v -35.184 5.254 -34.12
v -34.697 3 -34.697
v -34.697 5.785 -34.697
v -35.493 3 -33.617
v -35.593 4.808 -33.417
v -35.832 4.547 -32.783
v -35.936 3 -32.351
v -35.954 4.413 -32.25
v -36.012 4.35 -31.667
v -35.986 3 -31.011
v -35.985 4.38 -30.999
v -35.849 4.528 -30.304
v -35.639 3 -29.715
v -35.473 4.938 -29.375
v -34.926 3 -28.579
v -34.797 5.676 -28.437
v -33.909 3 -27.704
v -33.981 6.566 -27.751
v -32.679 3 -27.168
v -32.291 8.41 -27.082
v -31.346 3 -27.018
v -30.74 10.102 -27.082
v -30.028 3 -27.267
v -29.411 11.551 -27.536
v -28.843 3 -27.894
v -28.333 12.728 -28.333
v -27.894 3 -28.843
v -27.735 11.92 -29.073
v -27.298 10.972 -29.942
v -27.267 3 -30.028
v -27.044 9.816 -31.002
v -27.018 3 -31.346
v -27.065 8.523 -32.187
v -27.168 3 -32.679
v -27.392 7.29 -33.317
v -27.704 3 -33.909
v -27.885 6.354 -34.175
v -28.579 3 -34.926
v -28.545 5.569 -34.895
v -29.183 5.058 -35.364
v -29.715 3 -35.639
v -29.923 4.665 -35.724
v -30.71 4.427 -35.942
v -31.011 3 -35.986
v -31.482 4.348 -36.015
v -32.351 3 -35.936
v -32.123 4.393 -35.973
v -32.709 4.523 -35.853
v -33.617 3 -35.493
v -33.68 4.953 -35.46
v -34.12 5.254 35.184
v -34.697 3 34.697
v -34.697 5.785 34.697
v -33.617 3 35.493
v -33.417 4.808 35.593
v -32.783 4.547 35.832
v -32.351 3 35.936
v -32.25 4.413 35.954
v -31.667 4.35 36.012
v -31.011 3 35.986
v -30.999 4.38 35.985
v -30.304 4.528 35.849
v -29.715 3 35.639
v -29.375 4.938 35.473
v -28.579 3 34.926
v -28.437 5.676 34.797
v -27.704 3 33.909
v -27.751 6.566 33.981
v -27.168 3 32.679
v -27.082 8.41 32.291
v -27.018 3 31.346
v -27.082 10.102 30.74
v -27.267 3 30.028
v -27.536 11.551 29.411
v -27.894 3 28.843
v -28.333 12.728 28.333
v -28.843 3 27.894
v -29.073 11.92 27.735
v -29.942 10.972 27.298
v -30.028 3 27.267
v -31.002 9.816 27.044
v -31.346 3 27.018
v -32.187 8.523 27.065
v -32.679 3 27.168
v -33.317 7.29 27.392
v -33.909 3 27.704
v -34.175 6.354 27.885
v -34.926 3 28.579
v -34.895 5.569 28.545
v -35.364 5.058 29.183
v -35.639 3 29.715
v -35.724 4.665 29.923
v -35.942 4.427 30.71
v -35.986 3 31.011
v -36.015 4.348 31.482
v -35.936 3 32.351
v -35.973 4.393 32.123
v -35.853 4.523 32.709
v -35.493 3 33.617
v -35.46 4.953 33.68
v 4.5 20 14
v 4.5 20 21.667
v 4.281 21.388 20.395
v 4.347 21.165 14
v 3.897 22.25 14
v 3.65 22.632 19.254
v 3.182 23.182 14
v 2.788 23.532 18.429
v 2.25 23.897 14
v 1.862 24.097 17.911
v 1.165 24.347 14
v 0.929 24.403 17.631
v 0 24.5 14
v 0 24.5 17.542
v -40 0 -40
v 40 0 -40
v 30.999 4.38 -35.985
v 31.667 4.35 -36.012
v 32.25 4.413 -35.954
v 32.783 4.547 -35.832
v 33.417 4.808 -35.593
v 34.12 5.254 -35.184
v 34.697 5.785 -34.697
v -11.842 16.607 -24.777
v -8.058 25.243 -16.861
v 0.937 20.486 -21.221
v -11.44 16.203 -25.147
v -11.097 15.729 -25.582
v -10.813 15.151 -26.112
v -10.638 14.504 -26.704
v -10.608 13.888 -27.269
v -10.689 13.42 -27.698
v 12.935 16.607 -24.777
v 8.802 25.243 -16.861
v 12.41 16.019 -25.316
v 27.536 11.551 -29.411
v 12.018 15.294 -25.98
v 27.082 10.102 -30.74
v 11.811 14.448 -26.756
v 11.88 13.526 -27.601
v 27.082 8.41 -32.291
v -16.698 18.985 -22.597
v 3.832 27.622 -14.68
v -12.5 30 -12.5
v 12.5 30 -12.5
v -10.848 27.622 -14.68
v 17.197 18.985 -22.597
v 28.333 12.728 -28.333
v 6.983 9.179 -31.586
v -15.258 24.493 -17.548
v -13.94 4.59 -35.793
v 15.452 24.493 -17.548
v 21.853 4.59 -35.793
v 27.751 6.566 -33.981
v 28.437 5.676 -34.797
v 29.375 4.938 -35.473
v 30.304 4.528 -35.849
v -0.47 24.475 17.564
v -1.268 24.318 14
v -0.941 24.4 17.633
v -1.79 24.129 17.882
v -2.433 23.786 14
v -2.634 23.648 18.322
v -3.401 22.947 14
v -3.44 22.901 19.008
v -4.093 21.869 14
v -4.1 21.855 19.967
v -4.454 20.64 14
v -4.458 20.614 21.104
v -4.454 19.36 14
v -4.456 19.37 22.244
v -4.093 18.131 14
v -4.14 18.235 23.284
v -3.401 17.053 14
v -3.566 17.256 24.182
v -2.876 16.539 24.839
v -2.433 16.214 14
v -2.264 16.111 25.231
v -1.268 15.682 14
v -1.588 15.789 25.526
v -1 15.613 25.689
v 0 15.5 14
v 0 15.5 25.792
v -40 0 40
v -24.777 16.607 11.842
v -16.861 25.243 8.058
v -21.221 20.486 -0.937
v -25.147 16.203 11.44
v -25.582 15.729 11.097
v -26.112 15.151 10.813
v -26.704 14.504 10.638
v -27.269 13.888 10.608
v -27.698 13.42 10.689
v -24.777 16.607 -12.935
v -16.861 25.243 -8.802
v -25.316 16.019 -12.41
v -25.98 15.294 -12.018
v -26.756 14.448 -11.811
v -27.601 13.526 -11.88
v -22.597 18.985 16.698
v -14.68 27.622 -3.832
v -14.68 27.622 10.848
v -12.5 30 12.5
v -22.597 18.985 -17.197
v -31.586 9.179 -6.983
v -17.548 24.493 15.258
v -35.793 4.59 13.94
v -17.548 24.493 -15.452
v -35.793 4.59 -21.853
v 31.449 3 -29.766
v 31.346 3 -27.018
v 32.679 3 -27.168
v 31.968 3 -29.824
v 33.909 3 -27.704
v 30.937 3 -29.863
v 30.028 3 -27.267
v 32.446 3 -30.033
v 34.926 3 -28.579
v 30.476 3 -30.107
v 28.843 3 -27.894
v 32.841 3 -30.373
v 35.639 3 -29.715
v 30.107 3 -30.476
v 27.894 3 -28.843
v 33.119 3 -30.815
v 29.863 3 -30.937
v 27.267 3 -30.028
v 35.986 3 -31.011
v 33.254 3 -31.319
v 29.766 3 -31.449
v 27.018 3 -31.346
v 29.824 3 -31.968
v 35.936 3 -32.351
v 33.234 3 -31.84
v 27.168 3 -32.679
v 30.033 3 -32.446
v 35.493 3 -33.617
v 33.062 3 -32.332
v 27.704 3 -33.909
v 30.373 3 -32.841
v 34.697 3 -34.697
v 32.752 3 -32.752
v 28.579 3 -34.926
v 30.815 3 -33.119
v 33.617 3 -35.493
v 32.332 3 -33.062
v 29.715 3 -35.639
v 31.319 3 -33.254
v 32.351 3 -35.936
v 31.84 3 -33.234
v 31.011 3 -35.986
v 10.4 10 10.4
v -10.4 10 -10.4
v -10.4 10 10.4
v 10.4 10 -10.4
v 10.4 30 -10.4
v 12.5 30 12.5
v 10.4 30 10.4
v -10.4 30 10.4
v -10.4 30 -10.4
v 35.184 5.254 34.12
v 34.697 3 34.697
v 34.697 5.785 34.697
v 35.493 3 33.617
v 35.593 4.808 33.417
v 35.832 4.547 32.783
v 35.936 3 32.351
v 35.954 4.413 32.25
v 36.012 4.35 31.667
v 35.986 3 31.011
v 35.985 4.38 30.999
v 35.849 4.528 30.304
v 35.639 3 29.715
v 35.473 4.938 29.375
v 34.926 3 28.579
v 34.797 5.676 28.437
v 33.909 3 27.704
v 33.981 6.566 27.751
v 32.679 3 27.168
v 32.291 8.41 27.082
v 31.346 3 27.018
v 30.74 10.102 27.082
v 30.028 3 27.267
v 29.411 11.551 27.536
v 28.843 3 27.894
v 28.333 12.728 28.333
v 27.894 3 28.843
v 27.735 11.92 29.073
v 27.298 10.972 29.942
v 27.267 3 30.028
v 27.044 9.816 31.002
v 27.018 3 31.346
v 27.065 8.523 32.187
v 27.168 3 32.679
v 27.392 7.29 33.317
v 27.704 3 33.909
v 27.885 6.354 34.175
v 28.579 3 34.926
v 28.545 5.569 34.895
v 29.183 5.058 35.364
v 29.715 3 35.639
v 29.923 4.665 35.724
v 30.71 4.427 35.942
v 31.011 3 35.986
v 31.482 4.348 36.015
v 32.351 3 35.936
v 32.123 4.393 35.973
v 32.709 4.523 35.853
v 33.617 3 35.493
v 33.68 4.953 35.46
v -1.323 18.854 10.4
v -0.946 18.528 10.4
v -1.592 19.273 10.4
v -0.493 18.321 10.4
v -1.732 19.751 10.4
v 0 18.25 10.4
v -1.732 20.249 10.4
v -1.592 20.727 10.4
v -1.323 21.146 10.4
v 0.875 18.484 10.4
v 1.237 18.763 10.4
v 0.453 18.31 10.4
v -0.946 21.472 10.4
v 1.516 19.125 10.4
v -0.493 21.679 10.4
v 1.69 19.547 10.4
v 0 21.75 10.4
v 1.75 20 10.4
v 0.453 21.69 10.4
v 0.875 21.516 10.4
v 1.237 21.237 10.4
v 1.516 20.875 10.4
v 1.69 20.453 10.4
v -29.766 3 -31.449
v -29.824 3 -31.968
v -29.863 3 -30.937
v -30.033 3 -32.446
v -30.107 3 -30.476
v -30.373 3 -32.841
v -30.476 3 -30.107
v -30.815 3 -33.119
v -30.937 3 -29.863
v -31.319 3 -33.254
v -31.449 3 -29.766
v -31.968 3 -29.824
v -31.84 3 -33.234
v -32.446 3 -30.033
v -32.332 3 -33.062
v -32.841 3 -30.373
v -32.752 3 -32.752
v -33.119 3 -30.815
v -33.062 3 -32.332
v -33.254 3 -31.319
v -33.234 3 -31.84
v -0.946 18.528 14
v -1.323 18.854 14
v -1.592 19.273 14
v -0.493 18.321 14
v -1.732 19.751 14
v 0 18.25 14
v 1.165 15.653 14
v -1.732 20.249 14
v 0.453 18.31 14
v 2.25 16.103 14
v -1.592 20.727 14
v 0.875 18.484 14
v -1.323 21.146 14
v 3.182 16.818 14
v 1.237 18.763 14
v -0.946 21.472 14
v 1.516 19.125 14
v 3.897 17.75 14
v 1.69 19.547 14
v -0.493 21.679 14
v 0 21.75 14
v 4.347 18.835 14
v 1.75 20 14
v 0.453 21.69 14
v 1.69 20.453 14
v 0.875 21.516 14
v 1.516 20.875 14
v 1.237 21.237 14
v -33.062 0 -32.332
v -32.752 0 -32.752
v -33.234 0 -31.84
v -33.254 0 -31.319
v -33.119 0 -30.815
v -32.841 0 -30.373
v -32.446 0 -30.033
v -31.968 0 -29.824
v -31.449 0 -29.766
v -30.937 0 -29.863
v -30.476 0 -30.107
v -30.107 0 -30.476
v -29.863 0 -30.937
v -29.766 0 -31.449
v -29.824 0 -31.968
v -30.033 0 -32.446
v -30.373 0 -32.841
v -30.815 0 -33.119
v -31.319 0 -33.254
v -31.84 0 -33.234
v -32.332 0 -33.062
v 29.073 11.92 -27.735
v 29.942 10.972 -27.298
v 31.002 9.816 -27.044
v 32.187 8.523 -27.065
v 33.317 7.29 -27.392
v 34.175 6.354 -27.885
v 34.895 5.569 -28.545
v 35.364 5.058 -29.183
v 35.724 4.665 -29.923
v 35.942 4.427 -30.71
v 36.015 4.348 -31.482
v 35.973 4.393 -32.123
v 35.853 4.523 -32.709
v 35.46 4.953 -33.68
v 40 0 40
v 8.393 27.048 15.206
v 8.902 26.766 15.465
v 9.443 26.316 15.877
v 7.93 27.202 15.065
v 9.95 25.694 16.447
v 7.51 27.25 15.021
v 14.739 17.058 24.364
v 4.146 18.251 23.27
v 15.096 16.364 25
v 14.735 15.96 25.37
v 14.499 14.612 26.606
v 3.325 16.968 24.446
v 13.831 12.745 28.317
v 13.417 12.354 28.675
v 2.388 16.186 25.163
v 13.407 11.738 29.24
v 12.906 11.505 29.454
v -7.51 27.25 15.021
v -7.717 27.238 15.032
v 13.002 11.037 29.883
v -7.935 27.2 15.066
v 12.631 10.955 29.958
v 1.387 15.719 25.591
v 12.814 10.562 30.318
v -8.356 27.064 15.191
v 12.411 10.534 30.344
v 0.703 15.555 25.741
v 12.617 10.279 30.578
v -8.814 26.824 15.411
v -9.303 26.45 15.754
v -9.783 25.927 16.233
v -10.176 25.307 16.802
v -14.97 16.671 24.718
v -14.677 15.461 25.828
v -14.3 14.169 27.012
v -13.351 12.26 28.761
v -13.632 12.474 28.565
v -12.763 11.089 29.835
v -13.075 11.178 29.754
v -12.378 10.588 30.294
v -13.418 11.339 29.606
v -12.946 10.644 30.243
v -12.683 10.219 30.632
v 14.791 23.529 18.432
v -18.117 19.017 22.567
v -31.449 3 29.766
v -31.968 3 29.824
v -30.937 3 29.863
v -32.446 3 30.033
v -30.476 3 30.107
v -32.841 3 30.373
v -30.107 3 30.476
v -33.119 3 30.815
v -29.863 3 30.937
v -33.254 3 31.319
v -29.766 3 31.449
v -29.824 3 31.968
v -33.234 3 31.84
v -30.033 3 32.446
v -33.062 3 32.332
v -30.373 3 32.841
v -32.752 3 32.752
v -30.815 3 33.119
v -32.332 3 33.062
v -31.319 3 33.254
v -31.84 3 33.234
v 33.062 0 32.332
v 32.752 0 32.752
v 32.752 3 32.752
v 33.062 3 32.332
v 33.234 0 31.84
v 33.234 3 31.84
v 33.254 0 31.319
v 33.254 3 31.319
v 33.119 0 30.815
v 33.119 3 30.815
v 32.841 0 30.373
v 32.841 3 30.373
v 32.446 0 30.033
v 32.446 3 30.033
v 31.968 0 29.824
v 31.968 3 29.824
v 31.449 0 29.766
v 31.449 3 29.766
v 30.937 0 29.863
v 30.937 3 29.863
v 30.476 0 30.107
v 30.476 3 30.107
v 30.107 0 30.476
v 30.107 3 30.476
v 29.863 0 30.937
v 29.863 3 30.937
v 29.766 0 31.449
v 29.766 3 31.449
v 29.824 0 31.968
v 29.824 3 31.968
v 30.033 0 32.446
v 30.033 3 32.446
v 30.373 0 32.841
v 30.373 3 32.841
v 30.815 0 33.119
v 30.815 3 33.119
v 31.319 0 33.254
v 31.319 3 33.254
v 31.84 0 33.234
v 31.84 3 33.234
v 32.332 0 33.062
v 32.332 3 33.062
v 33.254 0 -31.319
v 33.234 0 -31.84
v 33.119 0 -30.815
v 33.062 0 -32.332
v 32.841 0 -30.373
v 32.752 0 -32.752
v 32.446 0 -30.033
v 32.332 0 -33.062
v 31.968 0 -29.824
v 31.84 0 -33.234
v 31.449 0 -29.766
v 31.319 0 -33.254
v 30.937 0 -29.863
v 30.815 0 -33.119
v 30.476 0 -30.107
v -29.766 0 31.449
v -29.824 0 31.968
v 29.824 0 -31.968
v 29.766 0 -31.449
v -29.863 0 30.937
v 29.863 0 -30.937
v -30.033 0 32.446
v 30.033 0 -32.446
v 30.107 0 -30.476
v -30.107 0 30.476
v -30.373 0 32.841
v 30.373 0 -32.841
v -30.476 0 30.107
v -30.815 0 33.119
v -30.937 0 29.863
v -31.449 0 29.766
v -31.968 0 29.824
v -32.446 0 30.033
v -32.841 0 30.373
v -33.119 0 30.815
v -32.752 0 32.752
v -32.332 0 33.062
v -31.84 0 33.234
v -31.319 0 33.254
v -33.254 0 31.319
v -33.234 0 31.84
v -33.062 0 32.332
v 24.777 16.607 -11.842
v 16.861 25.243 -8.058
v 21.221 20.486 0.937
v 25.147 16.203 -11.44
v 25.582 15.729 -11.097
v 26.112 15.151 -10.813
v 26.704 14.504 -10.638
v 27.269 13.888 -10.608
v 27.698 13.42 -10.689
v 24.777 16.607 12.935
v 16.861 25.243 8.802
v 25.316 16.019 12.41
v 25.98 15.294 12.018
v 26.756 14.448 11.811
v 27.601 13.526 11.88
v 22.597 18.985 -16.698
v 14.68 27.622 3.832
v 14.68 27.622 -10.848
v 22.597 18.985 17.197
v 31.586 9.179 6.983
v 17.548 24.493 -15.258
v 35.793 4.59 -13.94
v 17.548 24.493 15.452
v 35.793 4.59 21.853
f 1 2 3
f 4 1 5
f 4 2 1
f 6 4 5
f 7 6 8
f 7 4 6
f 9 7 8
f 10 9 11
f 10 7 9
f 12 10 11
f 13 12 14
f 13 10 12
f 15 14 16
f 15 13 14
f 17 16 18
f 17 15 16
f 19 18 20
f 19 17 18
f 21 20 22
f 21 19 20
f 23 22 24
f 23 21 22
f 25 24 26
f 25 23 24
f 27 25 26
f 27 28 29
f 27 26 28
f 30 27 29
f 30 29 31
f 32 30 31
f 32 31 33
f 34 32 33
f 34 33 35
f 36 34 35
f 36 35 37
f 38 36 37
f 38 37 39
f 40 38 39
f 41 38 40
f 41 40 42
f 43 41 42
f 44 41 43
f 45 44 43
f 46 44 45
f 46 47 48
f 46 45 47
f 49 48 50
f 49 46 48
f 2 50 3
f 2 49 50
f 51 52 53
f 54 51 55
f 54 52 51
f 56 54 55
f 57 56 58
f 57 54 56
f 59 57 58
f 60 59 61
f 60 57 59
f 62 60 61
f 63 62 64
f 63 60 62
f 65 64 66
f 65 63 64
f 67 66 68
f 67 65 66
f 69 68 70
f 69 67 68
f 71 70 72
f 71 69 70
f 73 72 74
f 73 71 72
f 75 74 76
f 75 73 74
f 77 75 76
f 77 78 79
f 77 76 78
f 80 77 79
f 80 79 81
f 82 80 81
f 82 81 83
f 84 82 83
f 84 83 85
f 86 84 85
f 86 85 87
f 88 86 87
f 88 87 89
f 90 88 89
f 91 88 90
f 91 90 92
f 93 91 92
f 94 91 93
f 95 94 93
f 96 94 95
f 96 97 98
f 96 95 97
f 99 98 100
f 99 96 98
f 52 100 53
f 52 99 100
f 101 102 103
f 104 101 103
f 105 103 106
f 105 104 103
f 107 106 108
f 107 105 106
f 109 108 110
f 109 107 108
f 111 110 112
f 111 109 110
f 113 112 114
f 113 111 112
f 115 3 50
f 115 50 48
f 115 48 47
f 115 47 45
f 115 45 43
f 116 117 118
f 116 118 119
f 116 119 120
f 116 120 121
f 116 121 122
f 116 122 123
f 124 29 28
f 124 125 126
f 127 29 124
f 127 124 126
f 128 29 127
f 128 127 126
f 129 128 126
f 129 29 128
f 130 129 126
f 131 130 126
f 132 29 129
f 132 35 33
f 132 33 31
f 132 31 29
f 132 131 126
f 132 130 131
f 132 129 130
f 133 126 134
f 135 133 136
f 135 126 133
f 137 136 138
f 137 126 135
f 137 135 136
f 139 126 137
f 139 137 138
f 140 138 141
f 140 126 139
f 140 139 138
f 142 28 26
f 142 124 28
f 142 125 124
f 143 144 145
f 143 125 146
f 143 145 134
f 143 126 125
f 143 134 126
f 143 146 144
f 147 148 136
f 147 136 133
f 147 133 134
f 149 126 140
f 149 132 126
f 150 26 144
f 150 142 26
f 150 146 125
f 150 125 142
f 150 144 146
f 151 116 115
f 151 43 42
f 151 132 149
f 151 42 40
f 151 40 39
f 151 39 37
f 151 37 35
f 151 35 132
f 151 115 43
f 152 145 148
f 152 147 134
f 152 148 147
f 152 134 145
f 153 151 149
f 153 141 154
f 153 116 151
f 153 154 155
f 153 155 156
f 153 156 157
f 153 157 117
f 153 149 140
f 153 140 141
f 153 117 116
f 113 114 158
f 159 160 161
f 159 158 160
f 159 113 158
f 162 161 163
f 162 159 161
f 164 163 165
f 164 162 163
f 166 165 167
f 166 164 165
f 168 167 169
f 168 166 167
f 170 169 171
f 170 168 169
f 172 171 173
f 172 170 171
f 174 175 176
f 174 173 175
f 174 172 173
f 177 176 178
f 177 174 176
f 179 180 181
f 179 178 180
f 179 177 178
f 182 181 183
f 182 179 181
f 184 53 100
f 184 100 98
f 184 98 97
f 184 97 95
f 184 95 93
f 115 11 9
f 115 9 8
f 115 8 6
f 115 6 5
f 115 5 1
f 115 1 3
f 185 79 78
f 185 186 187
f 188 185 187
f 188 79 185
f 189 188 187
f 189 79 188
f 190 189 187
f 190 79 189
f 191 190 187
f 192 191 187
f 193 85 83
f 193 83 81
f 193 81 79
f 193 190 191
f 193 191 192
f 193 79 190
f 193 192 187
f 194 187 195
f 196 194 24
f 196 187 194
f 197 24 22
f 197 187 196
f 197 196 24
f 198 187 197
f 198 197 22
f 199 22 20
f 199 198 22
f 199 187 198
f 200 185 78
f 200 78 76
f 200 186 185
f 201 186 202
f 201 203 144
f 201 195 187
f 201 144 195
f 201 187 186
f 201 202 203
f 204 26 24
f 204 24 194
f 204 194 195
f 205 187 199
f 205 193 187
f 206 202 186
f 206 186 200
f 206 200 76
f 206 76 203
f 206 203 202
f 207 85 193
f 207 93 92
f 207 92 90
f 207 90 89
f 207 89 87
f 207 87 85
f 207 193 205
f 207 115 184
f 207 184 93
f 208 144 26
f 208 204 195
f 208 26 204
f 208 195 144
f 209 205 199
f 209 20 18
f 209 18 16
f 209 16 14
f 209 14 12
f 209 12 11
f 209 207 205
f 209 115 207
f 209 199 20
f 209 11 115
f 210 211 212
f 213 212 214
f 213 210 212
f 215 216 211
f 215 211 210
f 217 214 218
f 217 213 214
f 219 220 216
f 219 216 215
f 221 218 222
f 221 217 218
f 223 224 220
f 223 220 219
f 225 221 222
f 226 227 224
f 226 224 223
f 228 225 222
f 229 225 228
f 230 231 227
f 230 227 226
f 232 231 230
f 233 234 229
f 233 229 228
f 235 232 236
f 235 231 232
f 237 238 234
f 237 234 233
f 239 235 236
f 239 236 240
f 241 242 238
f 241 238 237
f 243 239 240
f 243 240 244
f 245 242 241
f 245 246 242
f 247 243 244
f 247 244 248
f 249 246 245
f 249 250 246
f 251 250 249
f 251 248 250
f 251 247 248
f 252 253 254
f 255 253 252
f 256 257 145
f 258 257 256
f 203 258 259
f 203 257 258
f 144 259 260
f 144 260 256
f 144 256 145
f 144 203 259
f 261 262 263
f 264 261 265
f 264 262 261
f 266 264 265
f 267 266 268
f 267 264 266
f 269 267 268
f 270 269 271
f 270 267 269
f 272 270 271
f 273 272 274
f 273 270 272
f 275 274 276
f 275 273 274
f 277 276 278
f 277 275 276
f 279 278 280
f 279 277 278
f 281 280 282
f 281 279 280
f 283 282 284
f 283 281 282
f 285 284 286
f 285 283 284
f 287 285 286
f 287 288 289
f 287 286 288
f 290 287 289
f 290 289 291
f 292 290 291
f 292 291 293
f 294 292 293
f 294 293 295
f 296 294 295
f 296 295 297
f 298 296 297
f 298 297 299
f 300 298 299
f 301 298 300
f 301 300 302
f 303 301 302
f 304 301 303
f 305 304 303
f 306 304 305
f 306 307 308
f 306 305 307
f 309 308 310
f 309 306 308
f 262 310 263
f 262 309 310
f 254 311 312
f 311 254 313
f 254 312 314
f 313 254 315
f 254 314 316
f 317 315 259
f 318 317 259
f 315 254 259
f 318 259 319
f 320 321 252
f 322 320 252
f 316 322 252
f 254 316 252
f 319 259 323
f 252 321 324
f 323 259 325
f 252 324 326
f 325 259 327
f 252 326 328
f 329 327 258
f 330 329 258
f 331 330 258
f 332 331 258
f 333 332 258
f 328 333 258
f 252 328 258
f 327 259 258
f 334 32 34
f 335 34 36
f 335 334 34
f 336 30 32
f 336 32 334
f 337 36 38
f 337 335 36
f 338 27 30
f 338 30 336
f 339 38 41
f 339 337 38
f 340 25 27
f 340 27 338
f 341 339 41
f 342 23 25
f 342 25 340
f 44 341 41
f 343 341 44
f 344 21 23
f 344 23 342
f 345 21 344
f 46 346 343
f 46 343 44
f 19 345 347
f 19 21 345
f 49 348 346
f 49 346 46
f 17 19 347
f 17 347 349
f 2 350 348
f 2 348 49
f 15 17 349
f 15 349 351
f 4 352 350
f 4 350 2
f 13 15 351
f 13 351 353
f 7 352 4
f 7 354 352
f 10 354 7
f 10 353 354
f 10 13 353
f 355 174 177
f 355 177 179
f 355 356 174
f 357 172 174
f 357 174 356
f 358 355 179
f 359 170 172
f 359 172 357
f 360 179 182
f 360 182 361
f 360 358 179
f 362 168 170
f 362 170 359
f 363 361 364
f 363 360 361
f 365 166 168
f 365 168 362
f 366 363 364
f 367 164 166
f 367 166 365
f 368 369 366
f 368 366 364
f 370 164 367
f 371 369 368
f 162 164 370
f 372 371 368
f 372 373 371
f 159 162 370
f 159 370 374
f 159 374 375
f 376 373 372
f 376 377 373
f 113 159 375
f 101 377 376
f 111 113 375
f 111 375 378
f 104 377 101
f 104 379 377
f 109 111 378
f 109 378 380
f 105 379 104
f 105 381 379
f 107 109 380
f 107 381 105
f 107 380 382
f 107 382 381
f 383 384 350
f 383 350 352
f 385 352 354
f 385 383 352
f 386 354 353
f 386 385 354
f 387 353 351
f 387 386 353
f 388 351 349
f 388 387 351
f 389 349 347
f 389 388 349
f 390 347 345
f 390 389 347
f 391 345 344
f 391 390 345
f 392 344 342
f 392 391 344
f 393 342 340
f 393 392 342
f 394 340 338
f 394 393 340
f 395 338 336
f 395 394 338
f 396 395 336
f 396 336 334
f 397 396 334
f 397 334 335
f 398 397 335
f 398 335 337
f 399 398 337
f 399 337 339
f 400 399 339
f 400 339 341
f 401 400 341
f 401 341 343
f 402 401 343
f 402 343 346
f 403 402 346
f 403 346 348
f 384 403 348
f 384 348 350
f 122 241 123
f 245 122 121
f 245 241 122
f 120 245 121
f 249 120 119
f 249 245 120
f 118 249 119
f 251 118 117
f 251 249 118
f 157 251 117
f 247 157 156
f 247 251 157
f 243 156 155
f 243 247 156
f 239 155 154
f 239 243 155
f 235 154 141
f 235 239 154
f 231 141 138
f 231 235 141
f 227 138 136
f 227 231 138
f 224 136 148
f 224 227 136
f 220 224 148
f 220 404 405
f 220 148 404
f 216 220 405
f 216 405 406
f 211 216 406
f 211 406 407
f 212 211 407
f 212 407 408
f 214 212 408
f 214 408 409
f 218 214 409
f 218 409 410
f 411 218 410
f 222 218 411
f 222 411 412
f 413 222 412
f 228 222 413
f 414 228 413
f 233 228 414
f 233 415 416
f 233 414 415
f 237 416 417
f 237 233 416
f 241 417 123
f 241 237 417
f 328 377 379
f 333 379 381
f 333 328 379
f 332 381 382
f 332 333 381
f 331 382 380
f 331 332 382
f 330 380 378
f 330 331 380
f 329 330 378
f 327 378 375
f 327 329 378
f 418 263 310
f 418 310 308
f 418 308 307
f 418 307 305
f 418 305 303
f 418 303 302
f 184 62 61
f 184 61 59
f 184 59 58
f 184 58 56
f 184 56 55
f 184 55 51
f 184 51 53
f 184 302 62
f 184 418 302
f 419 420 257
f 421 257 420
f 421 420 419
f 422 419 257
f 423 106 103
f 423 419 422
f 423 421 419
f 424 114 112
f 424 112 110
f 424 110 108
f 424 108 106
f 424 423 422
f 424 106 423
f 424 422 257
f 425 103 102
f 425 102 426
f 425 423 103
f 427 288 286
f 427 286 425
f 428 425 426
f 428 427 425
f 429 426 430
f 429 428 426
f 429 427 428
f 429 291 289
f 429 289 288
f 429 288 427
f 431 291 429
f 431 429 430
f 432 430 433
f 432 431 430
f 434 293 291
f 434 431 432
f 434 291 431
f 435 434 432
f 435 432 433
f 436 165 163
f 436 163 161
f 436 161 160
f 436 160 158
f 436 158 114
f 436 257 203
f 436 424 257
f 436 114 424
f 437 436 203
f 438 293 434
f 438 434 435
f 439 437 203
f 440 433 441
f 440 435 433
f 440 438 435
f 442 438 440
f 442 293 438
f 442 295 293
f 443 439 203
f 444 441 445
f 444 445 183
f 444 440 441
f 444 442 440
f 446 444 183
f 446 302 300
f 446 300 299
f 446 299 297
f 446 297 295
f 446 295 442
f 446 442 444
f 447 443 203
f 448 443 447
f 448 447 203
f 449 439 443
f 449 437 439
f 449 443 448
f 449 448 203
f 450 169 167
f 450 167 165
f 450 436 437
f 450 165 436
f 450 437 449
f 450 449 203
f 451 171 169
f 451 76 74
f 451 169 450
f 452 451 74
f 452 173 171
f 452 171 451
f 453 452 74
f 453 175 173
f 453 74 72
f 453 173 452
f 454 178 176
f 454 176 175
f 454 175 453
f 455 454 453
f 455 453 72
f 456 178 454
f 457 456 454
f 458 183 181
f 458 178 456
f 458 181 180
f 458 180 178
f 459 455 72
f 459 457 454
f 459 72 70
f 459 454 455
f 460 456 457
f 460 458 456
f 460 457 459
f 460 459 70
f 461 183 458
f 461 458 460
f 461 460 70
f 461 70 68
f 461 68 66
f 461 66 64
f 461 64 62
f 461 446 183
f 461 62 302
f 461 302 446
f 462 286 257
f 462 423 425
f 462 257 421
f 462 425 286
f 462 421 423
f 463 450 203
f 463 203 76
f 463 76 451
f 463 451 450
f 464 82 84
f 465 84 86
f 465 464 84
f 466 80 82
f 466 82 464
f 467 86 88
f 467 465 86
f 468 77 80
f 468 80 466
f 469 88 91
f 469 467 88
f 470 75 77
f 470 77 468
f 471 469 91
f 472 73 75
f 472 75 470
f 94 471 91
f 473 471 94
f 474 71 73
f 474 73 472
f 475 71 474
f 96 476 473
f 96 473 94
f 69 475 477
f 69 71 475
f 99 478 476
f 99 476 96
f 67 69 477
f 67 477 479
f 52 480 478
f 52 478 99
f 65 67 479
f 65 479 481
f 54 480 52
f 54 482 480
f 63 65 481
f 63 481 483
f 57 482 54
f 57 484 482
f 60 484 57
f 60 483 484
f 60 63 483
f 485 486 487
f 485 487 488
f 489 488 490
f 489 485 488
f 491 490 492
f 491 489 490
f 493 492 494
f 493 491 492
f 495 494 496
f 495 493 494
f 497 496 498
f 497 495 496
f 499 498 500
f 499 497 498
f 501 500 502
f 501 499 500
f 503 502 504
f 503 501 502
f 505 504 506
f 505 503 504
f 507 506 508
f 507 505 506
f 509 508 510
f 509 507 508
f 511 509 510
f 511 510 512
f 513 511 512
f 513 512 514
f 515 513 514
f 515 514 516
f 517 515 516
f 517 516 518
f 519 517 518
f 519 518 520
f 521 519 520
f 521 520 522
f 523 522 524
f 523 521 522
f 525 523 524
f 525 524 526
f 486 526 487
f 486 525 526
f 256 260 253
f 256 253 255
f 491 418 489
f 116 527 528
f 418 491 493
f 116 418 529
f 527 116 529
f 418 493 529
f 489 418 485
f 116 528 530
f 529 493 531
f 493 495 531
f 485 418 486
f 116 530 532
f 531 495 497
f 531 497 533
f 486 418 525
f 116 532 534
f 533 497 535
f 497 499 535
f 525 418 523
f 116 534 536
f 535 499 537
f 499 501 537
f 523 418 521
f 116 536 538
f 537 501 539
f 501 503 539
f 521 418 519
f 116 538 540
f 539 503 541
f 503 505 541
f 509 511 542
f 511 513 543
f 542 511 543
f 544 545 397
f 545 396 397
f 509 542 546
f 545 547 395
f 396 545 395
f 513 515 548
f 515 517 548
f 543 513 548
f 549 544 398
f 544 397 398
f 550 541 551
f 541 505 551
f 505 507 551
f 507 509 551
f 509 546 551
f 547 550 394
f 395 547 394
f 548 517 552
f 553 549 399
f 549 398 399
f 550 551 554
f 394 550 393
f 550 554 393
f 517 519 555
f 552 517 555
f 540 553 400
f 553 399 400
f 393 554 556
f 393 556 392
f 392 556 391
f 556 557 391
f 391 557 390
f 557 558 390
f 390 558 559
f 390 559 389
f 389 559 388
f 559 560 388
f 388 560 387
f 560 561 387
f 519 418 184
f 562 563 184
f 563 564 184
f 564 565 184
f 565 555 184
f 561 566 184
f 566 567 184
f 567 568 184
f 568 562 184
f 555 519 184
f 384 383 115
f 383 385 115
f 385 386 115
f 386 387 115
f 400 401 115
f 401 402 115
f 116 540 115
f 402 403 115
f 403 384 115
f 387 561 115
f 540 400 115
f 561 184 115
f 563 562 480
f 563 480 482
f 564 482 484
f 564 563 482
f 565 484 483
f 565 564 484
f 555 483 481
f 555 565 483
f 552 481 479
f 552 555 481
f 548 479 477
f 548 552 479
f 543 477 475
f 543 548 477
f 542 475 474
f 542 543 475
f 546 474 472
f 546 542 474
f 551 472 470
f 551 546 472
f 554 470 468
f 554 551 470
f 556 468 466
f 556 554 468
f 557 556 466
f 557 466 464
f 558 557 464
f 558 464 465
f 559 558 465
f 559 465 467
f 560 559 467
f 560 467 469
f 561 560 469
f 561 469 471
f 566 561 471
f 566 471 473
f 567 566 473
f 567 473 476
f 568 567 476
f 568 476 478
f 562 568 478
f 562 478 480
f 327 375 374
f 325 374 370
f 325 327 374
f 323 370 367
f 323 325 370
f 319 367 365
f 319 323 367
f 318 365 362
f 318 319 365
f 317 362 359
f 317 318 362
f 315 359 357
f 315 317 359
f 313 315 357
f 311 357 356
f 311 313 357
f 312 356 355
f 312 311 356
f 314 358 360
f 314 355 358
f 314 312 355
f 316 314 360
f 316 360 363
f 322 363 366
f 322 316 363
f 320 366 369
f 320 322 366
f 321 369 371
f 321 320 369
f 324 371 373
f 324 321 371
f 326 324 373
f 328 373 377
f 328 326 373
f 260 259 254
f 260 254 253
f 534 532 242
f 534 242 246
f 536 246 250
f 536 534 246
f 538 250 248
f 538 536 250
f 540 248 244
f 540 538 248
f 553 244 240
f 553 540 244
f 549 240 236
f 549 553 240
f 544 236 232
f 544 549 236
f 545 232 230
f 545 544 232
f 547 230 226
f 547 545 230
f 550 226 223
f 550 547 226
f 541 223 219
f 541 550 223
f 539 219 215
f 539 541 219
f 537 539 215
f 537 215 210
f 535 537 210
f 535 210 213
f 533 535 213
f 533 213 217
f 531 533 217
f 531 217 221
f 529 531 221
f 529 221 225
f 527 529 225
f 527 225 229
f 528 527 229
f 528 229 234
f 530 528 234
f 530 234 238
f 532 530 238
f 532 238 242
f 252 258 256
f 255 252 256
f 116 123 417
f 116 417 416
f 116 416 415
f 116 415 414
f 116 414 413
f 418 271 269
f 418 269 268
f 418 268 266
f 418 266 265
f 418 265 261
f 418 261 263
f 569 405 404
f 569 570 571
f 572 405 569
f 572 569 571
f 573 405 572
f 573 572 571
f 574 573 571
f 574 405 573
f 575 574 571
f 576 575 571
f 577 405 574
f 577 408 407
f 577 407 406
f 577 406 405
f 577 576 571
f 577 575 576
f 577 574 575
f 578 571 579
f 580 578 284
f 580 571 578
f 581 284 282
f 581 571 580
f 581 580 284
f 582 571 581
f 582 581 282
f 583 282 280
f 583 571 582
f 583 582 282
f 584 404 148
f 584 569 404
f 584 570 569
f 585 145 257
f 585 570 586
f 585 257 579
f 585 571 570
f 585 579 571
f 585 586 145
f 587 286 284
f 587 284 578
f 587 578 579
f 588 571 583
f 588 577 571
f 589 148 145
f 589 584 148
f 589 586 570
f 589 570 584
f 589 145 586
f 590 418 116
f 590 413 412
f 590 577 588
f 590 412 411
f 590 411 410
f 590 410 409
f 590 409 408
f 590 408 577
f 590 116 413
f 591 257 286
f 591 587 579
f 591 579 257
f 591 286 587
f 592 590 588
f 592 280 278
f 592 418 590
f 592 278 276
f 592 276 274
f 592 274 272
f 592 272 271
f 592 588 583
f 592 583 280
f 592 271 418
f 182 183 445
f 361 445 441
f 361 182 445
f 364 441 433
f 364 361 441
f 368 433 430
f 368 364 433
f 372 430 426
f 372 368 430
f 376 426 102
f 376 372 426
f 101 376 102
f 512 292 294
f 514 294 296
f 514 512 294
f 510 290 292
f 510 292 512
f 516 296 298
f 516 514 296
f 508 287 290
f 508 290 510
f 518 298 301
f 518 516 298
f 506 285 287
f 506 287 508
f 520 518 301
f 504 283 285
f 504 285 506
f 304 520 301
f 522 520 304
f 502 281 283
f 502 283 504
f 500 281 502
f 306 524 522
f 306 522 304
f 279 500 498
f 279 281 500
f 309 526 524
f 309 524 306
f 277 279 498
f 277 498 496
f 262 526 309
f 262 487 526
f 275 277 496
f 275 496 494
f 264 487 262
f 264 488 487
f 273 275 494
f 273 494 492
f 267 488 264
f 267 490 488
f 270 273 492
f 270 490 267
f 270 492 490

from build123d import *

# Parameters (mm, degrees)
SKETCH3_W          = 20.8
SKETCH3_H          = 20.8
CUT_EXTRUDE1_DEPTH = 20
SKETCH4_R          = 1.75
CUT_EXTRUDE2_DEPTH = 65.031242546
CUT_EXTRUDE5_START = 14
SKETCH4_3_R        = 4.5
SKETCH4_3_R_2      = 1.75
CUT_EXTRUDE5_DEPTH = 51.031242546
SKETCH5_R          = 1.75
CUT_EXTRUDE6_DEPTH = 65.031242546
CUT_EXTRUDE7_START = 3
SKETCH5_3_R        = 4.5
SKETCH5_3_R_2      = 1.75
CUT_EXTRUDE7_DEPTH = 62.031242546
CIRPATTERN1_COUNT  = 4


with BuildPart() as part:
    # Sketch2 → Loft1 section 0
    with BuildSketch(Plane(origin=(0, 30, 0), x_dir=(1, 0, 0), z_dir=(0, 1, 0))):
        with BuildLine():
            Line((12.5, -12.5), (-12.5, -12.5))
            Line((-12.5, -12.5), (-12.5, 12.5))
            Line((-12.5, 12.5), (12.5, 12.5))
            Line((12.5, 12.5), (12.5, -12.5))
        make_face()
    # Sketch1 → Loft1 section 1
    with BuildSketch(Plane(origin=(0, 0, 0), x_dir=(1, 0, 0), z_dir=(0, 1, 0))):
        with BuildLine():
            Line((40, -40), (-40, -40))
            Line((-40, -40), (-40, 40))
            Line((-40, 40), (40, 40))
            Line((40, 40), (40, -40))
        make_face()
    loft()

    # Sketch3 → Cut-Extrude1 (cut)
    with BuildSketch(Plane(origin=(0, 30, 0), x_dir=(1, 0, 0), z_dir=(0, 1, 0))):
        Rectangle(SKETCH3_W, SKETCH3_H)
    extrude(amount=-CUT_EXTRUDE1_DEPTH, mode=Mode.SUBTRACT)

    # Sketch4 → Cut-Extrude2 (cut, through all)
    with BuildSketch(Plane.XY):
        with Locations((0, 20)):
            Circle(SKETCH4_R)
    extrude(amount=CUT_EXTRUDE2_DEPTH, mode=Mode.SUBTRACT)

    # Sketch4<3> → Cut-Extrude5 (cut, through all)
    with BuildSketch(Plane.XY.offset(CUT_EXTRUDE5_START)):
        with Locations((0, 20)):
            Circle(SKETCH4_3_R)
        with Locations((0, 20)):
            Circle(SKETCH4_3_R_2, mode=Mode.SUBTRACT)
    extrude(amount=CUT_EXTRUDE5_DEPTH, mode=Mode.SUBTRACT)

    # Sketch5 → Cut-Extrude6 (cut, through all)
    with BuildSketch(Plane(origin=(0, 0, 0), x_dir=(1, 0, 0), z_dir=(0, 1, 0))):
        with Locations((-31.514718626, 31.514718626)):
            Circle(SKETCH5_R)
    cut_extrude6 = extrude(amount=CUT_EXTRUDE6_DEPTH, mode=Mode.SUBTRACT)

    # Sketch5<3> → Cut-Extrude7 (cut, through all)
    with BuildSketch(Plane(origin=(0, 0, 0), x_dir=(1, 0, 0), z_dir=(0, 1, 0)).offset(CUT_EXTRUDE7_START)):
        with Locations((-31.514718626, 31.514718626)):
            Circle(SKETCH5_3_R)
        with Locations((-31.514718626, 31.514718626)):
            Circle(SKETCH5_3_R_2, mode=Mode.SUBTRACT)
    cut_extrude7 = extrude(amount=CUT_EXTRUDE7_DEPTH, mode=Mode.SUBTRACT)

    # CirPattern1: Cut-Extrude6, Cut-Extrude7 ×4 about axis
    cirpattern1_axis = Axis((0, 0, 0), (0, 1, 0))
    add([cut_extrude6.rotate(cirpattern1_axis, i * 360 / CIRPATTERN1_COUNT) for i in range(1, CIRPATTERN1_COUNT)], mode=Mode.SUBTRACT)
    add([cut_extrude7.rotate(cirpattern1_axis, i * 360 / CIRPATTERN1_COUNT) for i in range(1, CIRPATTERN1_COUNT)], mode=Mode.SUBTRACT)


solid = part.part
